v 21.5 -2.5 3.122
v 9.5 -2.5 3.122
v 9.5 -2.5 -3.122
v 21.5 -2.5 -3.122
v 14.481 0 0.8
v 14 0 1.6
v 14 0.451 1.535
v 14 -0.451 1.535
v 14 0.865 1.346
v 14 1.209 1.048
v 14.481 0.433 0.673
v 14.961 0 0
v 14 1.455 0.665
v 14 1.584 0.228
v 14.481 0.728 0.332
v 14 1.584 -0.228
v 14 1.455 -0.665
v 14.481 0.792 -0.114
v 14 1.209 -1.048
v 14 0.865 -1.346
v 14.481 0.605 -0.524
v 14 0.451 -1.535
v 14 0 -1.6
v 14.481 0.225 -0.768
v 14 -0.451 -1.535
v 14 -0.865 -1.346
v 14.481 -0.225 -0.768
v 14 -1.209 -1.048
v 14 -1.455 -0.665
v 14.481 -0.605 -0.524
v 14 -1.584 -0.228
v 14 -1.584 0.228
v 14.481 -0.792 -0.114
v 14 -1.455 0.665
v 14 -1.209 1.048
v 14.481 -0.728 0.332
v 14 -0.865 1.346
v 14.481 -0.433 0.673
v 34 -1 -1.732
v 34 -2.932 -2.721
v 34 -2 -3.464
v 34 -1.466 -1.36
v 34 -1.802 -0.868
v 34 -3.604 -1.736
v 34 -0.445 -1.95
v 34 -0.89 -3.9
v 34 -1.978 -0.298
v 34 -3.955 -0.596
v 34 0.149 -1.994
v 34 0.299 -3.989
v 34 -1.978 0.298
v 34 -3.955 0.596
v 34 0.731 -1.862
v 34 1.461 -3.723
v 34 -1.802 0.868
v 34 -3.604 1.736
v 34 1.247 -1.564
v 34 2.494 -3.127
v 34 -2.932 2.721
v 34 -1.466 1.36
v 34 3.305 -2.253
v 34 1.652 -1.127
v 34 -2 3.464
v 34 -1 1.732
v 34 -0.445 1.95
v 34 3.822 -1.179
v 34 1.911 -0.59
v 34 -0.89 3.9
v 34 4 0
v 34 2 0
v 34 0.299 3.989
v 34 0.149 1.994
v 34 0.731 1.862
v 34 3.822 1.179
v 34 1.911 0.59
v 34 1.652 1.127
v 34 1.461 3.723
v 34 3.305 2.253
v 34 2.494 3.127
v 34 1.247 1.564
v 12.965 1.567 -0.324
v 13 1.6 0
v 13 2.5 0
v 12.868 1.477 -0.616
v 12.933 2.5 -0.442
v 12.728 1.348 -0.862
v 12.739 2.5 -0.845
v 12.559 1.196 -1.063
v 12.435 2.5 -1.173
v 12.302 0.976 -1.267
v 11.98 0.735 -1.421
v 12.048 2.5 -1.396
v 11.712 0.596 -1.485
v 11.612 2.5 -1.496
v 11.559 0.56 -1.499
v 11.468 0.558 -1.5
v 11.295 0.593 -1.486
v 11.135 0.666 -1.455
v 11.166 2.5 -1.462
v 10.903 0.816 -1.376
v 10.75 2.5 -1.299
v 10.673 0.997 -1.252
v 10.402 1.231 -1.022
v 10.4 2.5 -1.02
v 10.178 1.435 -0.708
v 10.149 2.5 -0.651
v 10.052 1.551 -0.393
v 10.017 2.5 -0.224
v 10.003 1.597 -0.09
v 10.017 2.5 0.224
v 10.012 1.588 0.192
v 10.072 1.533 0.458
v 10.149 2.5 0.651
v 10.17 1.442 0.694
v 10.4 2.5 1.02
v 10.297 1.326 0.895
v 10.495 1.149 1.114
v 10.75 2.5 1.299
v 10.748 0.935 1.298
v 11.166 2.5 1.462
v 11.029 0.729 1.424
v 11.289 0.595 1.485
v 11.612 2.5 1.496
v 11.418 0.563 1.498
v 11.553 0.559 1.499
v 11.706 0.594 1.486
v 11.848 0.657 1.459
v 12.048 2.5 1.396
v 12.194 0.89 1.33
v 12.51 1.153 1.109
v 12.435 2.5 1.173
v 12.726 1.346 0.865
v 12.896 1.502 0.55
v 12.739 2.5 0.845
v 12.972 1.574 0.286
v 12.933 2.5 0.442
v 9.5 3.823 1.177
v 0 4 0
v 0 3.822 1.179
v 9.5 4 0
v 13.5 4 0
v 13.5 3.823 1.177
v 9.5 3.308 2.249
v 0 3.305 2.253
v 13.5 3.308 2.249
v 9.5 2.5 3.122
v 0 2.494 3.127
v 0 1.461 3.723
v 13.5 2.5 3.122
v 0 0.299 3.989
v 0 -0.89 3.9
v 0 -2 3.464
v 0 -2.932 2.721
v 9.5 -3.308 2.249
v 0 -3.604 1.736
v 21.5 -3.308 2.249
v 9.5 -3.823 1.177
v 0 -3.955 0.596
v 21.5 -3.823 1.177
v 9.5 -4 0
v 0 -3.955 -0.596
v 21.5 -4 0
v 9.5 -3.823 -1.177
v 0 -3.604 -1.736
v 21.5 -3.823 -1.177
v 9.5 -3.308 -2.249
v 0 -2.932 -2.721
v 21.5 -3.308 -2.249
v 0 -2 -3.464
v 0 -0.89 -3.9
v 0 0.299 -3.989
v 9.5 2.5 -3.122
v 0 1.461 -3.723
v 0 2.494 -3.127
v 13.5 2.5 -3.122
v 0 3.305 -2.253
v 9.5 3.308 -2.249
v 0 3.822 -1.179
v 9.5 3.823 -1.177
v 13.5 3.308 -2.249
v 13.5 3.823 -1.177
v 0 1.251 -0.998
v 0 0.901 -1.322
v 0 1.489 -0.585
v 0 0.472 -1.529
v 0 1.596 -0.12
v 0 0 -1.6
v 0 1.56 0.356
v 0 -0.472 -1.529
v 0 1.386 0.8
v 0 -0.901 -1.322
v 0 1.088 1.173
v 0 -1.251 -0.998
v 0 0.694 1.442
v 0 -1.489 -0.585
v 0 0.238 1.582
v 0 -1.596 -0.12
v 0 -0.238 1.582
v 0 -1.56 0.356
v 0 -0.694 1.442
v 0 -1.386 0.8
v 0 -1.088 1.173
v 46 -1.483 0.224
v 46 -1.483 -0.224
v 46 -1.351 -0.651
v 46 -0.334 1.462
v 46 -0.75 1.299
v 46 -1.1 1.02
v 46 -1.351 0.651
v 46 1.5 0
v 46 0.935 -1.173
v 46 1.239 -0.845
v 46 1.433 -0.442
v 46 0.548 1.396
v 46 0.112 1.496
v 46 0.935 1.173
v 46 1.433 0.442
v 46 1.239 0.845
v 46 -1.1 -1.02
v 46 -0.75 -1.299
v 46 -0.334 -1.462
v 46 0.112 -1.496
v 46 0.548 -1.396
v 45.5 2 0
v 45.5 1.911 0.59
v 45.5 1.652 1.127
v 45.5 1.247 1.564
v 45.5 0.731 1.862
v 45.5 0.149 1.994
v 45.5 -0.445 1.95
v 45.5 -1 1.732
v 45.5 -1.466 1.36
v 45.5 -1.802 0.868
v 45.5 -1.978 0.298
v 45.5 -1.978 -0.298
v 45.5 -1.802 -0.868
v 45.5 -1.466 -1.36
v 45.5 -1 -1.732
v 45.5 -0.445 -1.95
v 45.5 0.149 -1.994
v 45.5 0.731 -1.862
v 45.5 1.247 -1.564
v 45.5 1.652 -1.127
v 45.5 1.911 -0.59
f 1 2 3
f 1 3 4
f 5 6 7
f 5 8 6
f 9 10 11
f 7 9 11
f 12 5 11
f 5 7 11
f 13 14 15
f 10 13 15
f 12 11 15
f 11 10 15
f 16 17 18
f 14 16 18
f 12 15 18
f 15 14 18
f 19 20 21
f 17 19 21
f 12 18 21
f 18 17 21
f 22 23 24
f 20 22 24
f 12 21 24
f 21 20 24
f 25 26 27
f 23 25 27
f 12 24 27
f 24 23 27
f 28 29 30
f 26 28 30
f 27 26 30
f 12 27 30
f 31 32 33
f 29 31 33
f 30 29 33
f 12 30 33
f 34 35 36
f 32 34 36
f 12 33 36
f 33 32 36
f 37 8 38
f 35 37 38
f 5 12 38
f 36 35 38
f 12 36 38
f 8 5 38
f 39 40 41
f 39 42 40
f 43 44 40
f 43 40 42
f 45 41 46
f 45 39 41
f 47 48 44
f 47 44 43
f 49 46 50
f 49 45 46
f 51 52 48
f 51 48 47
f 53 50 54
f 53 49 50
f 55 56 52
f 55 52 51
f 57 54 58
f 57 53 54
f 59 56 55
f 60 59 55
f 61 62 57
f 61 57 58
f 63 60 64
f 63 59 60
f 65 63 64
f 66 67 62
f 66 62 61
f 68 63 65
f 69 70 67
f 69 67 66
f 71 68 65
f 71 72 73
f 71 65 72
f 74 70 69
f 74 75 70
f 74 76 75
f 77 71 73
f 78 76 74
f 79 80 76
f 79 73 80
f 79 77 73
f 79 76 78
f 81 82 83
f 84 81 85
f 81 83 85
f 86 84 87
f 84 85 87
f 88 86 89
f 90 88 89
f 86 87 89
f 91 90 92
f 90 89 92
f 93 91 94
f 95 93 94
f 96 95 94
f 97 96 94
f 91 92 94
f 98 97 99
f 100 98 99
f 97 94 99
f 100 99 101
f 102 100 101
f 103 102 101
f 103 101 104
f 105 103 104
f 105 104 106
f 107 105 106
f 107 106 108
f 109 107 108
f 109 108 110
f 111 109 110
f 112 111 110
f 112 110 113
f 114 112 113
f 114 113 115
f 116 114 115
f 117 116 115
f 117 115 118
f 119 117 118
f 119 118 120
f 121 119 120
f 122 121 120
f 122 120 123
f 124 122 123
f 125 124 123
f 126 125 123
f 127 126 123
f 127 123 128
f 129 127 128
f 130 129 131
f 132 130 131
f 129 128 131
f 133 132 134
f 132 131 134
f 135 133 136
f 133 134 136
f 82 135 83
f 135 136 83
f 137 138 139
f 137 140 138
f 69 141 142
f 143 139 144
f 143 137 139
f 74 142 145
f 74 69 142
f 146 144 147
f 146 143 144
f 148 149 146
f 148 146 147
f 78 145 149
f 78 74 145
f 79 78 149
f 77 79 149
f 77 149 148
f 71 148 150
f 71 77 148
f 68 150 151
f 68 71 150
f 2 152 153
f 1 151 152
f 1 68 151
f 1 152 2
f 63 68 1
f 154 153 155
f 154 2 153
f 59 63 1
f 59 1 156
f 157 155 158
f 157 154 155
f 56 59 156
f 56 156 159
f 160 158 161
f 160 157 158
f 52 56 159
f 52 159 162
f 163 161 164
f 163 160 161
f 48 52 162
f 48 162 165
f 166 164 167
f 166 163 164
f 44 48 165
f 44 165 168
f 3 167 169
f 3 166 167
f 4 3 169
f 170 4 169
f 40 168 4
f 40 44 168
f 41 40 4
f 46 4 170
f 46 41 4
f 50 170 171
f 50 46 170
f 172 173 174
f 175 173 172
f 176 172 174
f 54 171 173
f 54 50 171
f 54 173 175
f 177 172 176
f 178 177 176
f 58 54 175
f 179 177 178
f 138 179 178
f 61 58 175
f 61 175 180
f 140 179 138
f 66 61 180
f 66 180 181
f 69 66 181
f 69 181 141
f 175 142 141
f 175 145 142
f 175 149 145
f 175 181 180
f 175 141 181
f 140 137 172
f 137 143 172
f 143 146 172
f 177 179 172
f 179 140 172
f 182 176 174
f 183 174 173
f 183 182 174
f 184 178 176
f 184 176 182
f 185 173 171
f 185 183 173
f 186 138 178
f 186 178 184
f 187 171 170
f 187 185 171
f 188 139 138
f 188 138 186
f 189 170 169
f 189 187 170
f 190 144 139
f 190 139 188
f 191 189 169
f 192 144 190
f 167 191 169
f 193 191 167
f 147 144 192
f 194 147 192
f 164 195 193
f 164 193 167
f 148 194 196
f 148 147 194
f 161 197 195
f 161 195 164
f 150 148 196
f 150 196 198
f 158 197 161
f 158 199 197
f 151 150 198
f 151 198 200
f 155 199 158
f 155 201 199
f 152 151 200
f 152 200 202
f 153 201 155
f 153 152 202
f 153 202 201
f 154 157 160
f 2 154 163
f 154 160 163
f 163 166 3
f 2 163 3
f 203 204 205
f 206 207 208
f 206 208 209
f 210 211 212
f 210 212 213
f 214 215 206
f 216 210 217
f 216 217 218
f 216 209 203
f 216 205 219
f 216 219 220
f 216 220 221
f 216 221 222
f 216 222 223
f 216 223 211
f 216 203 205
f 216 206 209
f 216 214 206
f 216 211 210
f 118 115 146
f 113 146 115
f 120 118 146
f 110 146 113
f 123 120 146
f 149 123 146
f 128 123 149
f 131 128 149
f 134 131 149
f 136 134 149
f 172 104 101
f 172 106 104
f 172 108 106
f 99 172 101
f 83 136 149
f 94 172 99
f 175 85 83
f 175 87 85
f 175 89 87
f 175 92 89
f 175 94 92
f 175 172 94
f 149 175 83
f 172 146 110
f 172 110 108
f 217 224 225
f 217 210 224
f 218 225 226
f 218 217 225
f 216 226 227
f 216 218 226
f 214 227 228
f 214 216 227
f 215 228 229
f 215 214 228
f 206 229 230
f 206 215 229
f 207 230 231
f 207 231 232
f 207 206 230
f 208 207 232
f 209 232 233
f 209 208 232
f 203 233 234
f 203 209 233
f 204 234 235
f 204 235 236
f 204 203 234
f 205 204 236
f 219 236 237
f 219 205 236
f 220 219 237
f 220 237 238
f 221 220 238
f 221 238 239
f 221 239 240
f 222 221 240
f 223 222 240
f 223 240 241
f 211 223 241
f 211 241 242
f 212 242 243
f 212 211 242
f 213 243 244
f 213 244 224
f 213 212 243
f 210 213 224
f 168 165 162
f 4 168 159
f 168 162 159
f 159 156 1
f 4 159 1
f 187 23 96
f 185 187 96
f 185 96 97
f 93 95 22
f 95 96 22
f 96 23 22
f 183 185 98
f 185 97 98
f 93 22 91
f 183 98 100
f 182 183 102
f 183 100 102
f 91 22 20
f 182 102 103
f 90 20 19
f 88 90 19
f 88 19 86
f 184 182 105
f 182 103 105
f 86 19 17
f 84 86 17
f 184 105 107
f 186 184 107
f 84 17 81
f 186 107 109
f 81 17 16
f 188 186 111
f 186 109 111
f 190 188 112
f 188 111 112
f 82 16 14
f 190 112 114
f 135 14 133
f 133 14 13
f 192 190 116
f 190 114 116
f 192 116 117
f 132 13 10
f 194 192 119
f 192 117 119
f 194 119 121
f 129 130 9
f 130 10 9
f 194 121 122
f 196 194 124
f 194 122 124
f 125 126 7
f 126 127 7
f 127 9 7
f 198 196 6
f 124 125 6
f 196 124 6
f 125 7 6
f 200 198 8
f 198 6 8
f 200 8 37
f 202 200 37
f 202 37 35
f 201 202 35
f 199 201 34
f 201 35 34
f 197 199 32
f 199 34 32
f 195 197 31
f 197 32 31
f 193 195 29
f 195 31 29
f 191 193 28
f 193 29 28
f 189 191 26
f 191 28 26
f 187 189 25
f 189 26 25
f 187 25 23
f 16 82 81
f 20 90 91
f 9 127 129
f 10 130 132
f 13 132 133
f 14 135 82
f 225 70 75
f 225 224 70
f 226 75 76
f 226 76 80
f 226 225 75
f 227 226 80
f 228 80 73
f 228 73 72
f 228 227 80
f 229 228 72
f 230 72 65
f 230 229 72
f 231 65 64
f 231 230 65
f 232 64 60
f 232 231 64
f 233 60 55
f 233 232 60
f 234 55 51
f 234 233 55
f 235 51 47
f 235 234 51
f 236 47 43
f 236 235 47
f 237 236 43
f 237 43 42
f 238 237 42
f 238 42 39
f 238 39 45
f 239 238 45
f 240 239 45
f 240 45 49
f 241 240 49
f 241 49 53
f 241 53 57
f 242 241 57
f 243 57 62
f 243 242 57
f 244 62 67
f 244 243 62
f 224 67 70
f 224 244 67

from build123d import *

# Parameters (mm, degrees)
SKETCH_3_W                  = 12
SKETCH_3_H                  = 3.426661337
SKETCH_3_W_2                = 4
SKETCH_3_H_2                = 2.458257046
CUT_EXTRUDE_1_DEPTH         = 5
CUT_EXTRUDE_1_DEPTH_BACK    = 5
HOLE_WIZARD_3_2_3_2_1_D     = 3.2
HOLE_WIZARD_3_2_3_2_1_DEPTH = 14
HOLE_WIZARD_3_2_3_2_1_TIP   = 0.96137699
CUT_EXTRUDE_2_REACH         = 8.5
SKETCH_6_R                  = 1.5


with BuildPart() as part:
    # Эскиз1 → Повернуть1 (revolve)
    with BuildSketch(Plane.XY):
        Polygon((0, 0), (0, 4), (34, 4), (34, 2), (45.5, 2), (46, 1.5), (46, 0), align=None)
    revolve(axis=Axis((0, 0, 0), (1, 0, 0)))

    # Эскиз3 → Вырез-Вытянуть1 (cut, two sides)
    with BuildSketch(Plane.XY) as cut_extrude_1_sk:
        with Locations((15.5, -4.213330669)):
            Rectangle(SKETCH_3_W, SKETCH_3_H)
        with Locations((11.5, 3.729128523)):
            Rectangle(SKETCH_3_W_2, SKETCH_3_H_2)
    extrude(amount=CUT_EXTRUDE_1_DEPTH, mode=Mode.SUBTRACT)
    extrude(cut_extrude_1_sk.sketch, amount=-CUT_EXTRUDE_1_DEPTH_BACK, mode=Mode.SUBTRACT)

    # Диаметр отверстия Ø3.2 (3.2)1
    with Locations(Plane.ZY):
        with Locations((0, 0)):
            Hole(HOLE_WIZARD_3_2_3_2_1_D / 2, depth=HOLE_WIZARD_3_2_3_2_1_DEPTH)
            with Locations((0, 0, -(HOLE_WIZARD_3_2_3_2_1_DEPTH + HOLE_WIZARD_3_2_3_2_1_TIP / 2))):  # 118° drill point
                Cone(0, HOLE_WIZARD_3_2_3_2_1_D / 2, HOLE_WIZARD_3_2_3_2_1_TIP, mode=Mode.SUBTRACT)

    # Эскиз6 → Вырез-Вытянуть2 (cut, up to next)
    with BuildSketch(Plane(origin=(0, 2.5, 0), x_dir=(1, 0, 0), z_dir=(0, 1, 0)), mode=Mode.PRIVATE) as cut_extrude_2_sk1:
        with Locations((11.5, 0)):
            Circle(SKETCH_6_R)
    cut_extrude_2_tool1 = extrude(cut_extrude_2_sk1.sketch, amount=-CUT_EXTRUDE_2_REACH, mode=Mode.PRIVATE) & part.part
    add(cut_extrude_2_tool1.solids().sort_by_distance((11.5, 2.5, 0))[0], mode=Mode.SUBTRACT)


solid = part.part
